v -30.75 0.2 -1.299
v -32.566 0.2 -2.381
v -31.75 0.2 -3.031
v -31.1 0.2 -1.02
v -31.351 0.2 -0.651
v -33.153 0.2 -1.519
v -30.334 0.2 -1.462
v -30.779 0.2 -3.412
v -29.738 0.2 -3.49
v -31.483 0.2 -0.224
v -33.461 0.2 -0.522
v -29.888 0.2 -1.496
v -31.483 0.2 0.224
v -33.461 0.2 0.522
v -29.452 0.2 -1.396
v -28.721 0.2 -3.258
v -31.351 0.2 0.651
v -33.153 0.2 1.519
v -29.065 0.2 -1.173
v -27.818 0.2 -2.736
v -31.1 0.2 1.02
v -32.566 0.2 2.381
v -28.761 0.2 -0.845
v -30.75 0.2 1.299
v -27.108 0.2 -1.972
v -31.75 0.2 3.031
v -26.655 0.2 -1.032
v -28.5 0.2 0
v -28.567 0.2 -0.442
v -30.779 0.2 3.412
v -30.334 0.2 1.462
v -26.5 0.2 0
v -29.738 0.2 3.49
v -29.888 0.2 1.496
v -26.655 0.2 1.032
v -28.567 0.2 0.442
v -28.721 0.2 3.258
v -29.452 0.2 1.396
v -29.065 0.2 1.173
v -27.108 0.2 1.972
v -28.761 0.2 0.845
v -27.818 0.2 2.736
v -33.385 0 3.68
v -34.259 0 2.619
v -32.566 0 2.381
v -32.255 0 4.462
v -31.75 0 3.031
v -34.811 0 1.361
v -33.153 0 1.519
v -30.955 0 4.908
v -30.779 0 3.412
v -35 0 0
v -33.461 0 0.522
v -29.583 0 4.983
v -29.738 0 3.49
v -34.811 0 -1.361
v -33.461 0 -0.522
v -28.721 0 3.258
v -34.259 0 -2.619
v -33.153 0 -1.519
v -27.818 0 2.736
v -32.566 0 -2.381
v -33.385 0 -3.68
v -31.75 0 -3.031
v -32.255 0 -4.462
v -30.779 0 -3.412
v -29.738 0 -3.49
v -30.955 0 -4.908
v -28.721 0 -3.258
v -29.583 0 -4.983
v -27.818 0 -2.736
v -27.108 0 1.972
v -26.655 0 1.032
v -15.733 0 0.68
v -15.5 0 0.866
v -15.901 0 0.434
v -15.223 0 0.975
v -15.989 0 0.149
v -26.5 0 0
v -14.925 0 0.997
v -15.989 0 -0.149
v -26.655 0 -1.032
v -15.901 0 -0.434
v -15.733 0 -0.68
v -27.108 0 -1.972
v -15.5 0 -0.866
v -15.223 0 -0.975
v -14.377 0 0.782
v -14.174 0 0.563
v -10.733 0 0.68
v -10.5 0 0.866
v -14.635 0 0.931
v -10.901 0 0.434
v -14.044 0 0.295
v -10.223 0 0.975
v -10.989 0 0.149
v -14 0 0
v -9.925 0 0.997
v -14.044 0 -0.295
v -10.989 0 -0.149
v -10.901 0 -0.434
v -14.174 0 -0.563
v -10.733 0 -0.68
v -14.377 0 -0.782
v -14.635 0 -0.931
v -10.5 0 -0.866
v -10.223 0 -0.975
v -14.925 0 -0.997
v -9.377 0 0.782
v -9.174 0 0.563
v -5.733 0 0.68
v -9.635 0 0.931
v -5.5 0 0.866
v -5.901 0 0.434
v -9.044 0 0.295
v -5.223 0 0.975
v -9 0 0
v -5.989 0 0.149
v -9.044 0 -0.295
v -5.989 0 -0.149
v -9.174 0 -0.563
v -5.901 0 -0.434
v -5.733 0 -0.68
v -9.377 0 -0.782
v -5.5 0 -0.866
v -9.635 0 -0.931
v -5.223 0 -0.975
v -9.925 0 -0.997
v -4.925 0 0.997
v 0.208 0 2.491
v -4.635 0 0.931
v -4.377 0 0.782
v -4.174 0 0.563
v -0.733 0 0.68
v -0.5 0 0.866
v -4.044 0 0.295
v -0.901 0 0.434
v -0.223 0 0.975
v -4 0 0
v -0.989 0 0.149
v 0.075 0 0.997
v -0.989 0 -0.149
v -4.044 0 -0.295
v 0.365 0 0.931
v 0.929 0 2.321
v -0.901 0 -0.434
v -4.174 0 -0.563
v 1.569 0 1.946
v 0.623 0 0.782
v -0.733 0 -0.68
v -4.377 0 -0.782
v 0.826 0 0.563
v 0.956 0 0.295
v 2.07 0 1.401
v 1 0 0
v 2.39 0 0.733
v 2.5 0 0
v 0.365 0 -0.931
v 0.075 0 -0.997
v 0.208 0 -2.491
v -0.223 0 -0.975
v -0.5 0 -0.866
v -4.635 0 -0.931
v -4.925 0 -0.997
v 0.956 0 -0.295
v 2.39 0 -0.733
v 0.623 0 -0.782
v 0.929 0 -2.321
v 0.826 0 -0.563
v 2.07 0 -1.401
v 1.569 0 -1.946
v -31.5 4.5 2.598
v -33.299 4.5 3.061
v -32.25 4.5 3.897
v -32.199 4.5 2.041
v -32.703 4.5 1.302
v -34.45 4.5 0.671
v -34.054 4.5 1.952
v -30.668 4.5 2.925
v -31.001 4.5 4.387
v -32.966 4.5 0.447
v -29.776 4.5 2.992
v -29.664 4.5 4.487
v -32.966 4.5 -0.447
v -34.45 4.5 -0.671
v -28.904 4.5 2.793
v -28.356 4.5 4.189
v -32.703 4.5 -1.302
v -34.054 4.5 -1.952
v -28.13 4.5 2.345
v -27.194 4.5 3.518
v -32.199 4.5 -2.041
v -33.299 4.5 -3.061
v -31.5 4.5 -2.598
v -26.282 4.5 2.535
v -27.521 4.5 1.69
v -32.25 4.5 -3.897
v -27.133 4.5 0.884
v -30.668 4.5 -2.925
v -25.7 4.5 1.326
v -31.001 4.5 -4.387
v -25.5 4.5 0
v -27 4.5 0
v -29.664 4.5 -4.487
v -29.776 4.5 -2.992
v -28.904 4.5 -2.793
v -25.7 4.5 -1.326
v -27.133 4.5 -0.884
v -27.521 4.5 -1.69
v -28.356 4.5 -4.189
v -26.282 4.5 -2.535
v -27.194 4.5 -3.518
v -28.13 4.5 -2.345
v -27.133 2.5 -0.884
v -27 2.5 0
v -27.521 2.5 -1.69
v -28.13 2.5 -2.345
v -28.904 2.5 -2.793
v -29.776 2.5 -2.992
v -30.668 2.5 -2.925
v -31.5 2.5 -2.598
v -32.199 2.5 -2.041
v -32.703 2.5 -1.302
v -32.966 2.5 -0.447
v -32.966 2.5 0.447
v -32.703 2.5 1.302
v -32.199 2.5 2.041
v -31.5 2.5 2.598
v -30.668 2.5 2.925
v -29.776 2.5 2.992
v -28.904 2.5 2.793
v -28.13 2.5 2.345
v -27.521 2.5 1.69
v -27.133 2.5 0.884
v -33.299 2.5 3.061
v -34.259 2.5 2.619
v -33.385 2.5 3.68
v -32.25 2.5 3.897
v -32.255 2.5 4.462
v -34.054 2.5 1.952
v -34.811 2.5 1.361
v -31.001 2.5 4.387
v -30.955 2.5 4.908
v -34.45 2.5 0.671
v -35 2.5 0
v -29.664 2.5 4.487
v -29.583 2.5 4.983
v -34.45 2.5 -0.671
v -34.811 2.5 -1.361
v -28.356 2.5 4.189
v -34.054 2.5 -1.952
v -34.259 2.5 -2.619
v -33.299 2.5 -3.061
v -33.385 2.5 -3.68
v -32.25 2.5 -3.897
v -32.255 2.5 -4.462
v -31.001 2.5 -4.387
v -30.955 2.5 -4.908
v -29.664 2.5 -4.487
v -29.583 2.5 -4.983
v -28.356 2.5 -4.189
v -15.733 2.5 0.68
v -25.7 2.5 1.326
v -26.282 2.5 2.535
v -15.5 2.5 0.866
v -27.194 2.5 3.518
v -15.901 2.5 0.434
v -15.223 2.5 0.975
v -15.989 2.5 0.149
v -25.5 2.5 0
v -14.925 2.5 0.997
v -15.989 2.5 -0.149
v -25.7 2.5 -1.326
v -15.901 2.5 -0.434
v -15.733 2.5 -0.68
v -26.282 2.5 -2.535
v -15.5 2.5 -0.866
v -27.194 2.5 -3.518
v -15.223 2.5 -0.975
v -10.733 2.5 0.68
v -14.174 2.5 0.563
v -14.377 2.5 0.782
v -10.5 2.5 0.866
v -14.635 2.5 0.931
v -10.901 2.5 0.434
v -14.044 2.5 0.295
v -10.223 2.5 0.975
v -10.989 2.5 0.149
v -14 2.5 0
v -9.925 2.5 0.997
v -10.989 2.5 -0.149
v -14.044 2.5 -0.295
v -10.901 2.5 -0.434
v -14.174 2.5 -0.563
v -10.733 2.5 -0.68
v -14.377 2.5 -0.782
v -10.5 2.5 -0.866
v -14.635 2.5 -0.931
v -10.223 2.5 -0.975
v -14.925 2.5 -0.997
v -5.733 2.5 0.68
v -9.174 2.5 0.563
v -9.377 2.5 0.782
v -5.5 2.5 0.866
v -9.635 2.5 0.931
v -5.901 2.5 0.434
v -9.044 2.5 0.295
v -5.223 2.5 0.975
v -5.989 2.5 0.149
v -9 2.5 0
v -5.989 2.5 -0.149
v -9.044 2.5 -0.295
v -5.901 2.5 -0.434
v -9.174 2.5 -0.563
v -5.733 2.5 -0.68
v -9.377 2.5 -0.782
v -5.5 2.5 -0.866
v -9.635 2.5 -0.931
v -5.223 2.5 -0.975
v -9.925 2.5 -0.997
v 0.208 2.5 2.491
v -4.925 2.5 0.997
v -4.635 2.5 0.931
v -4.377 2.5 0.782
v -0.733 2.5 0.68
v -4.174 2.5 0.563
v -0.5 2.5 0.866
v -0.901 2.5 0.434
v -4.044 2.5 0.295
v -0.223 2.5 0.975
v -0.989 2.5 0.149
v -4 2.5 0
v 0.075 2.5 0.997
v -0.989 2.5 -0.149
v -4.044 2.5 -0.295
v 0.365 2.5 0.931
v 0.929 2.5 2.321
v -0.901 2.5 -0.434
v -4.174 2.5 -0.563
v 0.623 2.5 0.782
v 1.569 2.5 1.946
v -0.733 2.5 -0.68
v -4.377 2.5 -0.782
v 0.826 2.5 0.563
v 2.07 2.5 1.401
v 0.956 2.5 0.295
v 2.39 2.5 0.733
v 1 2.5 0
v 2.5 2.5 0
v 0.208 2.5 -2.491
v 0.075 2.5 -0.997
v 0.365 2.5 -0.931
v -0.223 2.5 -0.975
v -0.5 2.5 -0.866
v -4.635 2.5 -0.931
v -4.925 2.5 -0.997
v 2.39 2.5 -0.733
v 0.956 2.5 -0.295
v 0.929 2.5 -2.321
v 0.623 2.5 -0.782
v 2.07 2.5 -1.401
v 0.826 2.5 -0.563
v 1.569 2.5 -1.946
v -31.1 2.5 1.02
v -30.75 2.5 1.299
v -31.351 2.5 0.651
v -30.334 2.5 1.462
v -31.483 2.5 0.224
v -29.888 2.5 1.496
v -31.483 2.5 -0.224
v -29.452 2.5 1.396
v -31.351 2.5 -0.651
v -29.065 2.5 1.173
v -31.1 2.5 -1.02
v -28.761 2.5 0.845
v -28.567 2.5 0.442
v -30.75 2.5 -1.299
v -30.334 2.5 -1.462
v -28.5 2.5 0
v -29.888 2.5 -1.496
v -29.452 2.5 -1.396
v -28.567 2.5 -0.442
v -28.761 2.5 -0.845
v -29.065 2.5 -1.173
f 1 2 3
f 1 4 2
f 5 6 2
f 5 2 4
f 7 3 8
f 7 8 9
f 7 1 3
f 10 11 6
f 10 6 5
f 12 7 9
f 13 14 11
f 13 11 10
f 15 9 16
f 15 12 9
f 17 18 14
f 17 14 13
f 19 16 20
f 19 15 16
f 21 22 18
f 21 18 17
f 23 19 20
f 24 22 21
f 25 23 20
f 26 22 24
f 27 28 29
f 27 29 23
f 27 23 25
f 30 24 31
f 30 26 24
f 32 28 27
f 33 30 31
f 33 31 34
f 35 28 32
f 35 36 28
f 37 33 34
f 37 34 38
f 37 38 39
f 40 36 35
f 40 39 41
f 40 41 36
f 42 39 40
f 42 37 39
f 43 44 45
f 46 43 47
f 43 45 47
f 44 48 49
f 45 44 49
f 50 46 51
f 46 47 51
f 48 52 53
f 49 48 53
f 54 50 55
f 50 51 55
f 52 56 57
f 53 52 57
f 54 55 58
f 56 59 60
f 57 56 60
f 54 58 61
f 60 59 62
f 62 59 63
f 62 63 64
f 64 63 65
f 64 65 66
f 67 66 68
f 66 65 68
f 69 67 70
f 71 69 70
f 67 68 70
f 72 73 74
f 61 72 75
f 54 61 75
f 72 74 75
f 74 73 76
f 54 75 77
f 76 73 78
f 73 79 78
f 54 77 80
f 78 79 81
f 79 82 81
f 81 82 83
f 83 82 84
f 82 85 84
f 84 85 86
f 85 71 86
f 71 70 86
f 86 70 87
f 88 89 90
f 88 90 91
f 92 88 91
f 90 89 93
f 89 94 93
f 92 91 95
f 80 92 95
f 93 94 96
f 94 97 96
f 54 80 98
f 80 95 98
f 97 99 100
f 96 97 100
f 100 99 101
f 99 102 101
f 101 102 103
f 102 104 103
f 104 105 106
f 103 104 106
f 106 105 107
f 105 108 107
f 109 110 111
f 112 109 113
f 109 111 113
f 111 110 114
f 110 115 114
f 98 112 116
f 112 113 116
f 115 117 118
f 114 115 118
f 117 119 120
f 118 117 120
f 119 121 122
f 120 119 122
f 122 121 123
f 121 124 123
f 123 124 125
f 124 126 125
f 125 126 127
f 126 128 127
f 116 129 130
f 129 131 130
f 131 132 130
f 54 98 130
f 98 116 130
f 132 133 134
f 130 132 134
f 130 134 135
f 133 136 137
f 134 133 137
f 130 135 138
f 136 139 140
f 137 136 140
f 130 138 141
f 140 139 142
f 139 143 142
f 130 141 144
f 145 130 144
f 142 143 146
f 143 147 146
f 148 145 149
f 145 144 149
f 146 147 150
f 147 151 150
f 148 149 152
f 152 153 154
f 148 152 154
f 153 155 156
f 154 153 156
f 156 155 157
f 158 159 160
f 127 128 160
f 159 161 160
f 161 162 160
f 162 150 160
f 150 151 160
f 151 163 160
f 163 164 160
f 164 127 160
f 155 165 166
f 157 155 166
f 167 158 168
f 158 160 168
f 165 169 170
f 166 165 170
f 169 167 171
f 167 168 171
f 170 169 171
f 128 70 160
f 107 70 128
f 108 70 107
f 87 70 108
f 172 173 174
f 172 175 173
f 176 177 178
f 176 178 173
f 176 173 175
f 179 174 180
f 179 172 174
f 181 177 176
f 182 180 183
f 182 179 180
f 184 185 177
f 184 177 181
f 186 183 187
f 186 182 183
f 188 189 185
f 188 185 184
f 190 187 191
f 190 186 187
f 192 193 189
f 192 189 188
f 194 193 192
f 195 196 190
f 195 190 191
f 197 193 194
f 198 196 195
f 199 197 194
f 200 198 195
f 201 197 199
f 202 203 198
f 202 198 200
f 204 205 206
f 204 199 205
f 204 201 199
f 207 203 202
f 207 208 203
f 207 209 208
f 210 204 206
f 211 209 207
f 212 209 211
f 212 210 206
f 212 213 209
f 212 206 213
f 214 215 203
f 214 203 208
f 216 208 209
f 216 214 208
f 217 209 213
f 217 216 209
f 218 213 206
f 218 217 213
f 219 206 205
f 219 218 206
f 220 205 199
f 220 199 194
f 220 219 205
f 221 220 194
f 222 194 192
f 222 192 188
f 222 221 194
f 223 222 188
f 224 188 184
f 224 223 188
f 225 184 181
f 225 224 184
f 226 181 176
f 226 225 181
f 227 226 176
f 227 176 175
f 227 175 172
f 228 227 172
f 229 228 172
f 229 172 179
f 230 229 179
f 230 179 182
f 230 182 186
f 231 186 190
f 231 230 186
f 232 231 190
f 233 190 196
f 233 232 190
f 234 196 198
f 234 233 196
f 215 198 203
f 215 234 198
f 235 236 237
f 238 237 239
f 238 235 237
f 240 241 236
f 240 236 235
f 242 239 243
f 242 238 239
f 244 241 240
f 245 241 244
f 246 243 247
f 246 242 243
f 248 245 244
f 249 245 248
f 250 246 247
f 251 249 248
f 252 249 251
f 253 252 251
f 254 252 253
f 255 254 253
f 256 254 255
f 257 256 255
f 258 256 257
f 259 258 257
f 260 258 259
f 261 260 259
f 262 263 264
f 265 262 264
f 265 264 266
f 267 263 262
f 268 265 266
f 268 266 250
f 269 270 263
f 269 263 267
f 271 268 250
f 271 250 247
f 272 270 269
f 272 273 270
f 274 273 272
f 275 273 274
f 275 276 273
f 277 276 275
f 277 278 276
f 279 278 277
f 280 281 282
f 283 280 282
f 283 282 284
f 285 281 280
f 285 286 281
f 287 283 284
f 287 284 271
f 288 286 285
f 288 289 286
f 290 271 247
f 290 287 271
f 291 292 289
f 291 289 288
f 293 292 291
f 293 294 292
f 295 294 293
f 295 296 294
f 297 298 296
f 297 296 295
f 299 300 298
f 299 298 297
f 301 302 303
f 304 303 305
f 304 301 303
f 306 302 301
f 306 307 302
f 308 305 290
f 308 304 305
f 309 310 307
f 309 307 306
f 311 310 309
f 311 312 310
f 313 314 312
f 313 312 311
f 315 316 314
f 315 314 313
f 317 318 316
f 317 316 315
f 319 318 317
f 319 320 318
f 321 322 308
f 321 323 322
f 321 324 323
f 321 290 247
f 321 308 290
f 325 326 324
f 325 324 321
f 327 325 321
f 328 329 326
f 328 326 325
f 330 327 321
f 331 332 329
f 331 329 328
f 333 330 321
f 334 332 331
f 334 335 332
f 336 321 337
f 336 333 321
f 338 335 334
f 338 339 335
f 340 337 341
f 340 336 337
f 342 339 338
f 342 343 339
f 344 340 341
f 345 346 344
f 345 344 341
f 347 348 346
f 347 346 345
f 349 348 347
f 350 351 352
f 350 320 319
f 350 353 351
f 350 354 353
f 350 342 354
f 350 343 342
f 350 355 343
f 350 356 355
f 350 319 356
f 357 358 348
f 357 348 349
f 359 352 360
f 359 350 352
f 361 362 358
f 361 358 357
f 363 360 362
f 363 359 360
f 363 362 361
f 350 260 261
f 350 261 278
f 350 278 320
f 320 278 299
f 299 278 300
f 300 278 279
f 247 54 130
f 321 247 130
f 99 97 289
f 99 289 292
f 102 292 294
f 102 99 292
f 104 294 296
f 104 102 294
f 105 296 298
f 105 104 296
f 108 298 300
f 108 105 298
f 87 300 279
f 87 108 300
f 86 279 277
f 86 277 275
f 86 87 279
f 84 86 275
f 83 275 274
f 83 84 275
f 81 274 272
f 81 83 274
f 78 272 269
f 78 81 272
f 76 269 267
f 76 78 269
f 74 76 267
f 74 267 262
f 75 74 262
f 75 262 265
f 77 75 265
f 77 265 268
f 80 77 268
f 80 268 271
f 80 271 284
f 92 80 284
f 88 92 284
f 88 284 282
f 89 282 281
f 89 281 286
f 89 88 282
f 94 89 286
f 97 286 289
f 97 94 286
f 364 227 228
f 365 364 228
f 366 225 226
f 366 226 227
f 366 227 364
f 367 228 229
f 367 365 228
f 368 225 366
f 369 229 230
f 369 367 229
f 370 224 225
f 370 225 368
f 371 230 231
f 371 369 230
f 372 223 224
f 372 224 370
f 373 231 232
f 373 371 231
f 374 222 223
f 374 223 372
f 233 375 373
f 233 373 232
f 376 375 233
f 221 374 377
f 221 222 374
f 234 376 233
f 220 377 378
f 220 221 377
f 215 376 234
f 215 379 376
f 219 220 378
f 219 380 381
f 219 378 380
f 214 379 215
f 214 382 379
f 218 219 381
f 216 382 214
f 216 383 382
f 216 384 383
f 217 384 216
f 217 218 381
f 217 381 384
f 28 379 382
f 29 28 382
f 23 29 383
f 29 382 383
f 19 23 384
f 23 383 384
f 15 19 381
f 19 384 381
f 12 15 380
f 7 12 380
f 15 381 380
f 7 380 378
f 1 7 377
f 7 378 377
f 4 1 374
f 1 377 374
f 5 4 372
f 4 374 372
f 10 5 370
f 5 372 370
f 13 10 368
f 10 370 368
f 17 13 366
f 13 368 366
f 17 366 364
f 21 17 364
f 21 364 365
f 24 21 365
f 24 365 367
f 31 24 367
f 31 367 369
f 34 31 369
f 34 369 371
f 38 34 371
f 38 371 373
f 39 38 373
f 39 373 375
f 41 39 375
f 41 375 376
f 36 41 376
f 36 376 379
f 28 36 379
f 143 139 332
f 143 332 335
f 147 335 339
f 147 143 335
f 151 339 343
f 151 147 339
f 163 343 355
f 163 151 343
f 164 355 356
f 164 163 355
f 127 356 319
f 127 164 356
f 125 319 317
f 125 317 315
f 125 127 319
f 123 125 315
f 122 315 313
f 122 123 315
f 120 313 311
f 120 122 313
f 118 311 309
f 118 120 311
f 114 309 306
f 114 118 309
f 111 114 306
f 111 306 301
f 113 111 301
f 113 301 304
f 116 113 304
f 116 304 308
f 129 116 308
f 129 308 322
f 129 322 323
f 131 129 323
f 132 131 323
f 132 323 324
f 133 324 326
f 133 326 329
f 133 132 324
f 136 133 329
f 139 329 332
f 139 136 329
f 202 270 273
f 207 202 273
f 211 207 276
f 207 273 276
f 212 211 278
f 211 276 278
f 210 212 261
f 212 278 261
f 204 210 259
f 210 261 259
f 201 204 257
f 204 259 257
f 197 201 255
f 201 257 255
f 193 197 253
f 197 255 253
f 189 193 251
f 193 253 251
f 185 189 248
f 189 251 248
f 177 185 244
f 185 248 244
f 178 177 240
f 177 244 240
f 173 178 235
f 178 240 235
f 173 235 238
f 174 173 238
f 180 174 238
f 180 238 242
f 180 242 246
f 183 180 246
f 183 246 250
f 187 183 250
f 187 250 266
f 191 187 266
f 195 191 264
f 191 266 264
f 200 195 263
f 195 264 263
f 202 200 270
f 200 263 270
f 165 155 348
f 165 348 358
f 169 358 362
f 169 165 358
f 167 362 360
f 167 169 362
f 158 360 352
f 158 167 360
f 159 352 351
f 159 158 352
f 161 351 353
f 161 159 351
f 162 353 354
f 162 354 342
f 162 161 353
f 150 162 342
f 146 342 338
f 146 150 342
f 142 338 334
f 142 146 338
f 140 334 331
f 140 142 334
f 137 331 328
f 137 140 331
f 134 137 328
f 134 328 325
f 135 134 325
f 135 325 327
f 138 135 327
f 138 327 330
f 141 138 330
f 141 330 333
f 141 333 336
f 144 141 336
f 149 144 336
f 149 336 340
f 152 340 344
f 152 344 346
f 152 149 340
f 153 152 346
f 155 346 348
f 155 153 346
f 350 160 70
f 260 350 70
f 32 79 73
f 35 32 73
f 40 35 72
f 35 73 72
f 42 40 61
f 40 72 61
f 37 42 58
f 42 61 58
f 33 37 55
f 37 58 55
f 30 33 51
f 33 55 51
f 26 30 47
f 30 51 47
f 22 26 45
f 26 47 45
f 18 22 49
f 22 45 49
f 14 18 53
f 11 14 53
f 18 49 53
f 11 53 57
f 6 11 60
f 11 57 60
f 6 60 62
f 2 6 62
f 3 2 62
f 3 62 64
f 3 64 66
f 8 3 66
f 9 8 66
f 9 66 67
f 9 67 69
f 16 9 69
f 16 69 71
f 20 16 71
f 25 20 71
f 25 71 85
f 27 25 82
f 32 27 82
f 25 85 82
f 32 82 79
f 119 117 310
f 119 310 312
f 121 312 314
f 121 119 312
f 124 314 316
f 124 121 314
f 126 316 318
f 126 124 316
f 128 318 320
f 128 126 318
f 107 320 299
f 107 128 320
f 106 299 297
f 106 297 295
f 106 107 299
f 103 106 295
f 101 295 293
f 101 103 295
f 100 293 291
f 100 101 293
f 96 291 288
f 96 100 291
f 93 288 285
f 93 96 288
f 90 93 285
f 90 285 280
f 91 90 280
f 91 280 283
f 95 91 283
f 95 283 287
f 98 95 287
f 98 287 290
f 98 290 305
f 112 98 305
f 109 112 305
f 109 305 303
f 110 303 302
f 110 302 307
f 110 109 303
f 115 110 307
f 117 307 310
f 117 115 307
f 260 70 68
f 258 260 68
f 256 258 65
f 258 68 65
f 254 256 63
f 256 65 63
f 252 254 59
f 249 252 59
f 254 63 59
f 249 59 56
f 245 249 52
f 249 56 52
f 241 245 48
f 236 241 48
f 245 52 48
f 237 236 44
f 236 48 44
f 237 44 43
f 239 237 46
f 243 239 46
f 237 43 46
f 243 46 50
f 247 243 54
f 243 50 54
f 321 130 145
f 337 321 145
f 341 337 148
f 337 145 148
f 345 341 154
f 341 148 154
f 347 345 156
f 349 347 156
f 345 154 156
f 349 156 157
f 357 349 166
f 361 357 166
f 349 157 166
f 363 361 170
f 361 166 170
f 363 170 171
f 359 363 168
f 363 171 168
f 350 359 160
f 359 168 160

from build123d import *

# Parameters (mm, degrees)
SKETCH1_R           = 1
BOSS_EXTRUDE1_DEPTH = 2.5
SKETCH2_R           = 4.5
SKETCH2_R_2         = 3
BOSS_EXTRUDE2_DEPTH = 2
SKETCH3_R           = 1.5
CUT_EXTRUDE1_DEPTH  = 3.5
SKETCH4_R           = 3.5
CUT_EXTRUDE2_DEPTH  = 0.2


with BuildPart() as part:
    # Sketch1 → Boss-Extrude1 (new body)
    with BuildSketch(Plane(origin=(0, 0, 0), x_dir=(1, 0, 0), z_dir=(0, 1, 0))):
        with BuildLine():
            Line((0.208333333, 2.491304321), (-29.583333333, 4.982608643))
            ThreePointArc((-29.583333333, 4.982608643), (-35, 0), (-29.583333333, -4.982608643))
            Line((-29.583333333, -4.982608643), (0.208333333, -2.491304321))
            ThreePointArc((0.208333333, -2.491304321), (2.5, 0), (0.208333333, 2.491304321))
        make_face()
        with Locations((-15, 0)):
            Circle(SKETCH1_R, mode=Mode.SUBTRACT)
        with Locations((-10, 0)):
            Circle(SKETCH1_R, mode=Mode.SUBTRACT)
        with Locations((-5, 0)):
            Circle(SKETCH1_R, mode=Mode.SUBTRACT)
        Circle(SKETCH1_R, mode=Mode.SUBTRACT)
    extrude(amount=BOSS_EXTRUDE1_DEPTH)

    # Sketch2 → Boss-Extrude2 (add)
    with BuildSketch(Plane(origin=(0, 2.5, 0), x_dir=(1, 0, 0), z_dir=(0, 1, 0))):
        with Locations((-30, 0)):
            Circle(SKETCH2_R)
        with Locations((-30, 0)):
            Circle(SKETCH2_R_2, mode=Mode.SUBTRACT)
    extrude(amount=BOSS_EXTRUDE2_DEPTH)

    # Sketch3 → Cut-Extrude1 (cut, through all)
    with BuildSketch(Plane(origin=(0, 2.5, 0), x_dir=(1, 0, 0), z_dir=(0, 1, 0))):
        with Locations((-30, 0)):
            Circle(SKETCH3_R)
    extrude(amount=-CUT_EXTRUDE1_DEPTH, mode=Mode.SUBTRACT)

    # Sketch4 → Cut-Extrude2 (cut)
    with BuildSketch(Plane.XZ):
        with Locations((-30, 0)):
            Circle(SKETCH4_R)
    extrude(amount=-CUT_EXTRUDE2_DEPTH, mode=Mode.SUBTRACT)


solid = part.part
